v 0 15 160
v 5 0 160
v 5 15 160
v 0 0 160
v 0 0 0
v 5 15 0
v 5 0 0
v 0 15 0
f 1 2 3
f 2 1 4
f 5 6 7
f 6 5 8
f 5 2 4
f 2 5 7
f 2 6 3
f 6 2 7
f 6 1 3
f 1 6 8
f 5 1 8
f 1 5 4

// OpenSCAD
// file: common.scad
$fa = 1;
$fs = .4;

h1 = 40;
w1 = 2; // zmesti sa do skary?
d1 = 30;

h2 = 3; // zarovnane s vyskou dresu?
w2 = 40; // sirka medzery medzi chladnickou a dresom?
d2 = d1;

hole_wall = 3;
hole_h = 10;

stick_h = 160; // kolko sa zmesti na dosku?
stick_w = 5;
stick_d = 15;

head_h = 25;
head_hole_h = 10;

press_fit = 0;
tight_fit = .13;
normal_fit = .250;
loose_fit = .5;

delta = .01;
// main file
include <common.scad>;

// w, d, h

// Stick
cube([stick_w, stick_d, stick_h]);
